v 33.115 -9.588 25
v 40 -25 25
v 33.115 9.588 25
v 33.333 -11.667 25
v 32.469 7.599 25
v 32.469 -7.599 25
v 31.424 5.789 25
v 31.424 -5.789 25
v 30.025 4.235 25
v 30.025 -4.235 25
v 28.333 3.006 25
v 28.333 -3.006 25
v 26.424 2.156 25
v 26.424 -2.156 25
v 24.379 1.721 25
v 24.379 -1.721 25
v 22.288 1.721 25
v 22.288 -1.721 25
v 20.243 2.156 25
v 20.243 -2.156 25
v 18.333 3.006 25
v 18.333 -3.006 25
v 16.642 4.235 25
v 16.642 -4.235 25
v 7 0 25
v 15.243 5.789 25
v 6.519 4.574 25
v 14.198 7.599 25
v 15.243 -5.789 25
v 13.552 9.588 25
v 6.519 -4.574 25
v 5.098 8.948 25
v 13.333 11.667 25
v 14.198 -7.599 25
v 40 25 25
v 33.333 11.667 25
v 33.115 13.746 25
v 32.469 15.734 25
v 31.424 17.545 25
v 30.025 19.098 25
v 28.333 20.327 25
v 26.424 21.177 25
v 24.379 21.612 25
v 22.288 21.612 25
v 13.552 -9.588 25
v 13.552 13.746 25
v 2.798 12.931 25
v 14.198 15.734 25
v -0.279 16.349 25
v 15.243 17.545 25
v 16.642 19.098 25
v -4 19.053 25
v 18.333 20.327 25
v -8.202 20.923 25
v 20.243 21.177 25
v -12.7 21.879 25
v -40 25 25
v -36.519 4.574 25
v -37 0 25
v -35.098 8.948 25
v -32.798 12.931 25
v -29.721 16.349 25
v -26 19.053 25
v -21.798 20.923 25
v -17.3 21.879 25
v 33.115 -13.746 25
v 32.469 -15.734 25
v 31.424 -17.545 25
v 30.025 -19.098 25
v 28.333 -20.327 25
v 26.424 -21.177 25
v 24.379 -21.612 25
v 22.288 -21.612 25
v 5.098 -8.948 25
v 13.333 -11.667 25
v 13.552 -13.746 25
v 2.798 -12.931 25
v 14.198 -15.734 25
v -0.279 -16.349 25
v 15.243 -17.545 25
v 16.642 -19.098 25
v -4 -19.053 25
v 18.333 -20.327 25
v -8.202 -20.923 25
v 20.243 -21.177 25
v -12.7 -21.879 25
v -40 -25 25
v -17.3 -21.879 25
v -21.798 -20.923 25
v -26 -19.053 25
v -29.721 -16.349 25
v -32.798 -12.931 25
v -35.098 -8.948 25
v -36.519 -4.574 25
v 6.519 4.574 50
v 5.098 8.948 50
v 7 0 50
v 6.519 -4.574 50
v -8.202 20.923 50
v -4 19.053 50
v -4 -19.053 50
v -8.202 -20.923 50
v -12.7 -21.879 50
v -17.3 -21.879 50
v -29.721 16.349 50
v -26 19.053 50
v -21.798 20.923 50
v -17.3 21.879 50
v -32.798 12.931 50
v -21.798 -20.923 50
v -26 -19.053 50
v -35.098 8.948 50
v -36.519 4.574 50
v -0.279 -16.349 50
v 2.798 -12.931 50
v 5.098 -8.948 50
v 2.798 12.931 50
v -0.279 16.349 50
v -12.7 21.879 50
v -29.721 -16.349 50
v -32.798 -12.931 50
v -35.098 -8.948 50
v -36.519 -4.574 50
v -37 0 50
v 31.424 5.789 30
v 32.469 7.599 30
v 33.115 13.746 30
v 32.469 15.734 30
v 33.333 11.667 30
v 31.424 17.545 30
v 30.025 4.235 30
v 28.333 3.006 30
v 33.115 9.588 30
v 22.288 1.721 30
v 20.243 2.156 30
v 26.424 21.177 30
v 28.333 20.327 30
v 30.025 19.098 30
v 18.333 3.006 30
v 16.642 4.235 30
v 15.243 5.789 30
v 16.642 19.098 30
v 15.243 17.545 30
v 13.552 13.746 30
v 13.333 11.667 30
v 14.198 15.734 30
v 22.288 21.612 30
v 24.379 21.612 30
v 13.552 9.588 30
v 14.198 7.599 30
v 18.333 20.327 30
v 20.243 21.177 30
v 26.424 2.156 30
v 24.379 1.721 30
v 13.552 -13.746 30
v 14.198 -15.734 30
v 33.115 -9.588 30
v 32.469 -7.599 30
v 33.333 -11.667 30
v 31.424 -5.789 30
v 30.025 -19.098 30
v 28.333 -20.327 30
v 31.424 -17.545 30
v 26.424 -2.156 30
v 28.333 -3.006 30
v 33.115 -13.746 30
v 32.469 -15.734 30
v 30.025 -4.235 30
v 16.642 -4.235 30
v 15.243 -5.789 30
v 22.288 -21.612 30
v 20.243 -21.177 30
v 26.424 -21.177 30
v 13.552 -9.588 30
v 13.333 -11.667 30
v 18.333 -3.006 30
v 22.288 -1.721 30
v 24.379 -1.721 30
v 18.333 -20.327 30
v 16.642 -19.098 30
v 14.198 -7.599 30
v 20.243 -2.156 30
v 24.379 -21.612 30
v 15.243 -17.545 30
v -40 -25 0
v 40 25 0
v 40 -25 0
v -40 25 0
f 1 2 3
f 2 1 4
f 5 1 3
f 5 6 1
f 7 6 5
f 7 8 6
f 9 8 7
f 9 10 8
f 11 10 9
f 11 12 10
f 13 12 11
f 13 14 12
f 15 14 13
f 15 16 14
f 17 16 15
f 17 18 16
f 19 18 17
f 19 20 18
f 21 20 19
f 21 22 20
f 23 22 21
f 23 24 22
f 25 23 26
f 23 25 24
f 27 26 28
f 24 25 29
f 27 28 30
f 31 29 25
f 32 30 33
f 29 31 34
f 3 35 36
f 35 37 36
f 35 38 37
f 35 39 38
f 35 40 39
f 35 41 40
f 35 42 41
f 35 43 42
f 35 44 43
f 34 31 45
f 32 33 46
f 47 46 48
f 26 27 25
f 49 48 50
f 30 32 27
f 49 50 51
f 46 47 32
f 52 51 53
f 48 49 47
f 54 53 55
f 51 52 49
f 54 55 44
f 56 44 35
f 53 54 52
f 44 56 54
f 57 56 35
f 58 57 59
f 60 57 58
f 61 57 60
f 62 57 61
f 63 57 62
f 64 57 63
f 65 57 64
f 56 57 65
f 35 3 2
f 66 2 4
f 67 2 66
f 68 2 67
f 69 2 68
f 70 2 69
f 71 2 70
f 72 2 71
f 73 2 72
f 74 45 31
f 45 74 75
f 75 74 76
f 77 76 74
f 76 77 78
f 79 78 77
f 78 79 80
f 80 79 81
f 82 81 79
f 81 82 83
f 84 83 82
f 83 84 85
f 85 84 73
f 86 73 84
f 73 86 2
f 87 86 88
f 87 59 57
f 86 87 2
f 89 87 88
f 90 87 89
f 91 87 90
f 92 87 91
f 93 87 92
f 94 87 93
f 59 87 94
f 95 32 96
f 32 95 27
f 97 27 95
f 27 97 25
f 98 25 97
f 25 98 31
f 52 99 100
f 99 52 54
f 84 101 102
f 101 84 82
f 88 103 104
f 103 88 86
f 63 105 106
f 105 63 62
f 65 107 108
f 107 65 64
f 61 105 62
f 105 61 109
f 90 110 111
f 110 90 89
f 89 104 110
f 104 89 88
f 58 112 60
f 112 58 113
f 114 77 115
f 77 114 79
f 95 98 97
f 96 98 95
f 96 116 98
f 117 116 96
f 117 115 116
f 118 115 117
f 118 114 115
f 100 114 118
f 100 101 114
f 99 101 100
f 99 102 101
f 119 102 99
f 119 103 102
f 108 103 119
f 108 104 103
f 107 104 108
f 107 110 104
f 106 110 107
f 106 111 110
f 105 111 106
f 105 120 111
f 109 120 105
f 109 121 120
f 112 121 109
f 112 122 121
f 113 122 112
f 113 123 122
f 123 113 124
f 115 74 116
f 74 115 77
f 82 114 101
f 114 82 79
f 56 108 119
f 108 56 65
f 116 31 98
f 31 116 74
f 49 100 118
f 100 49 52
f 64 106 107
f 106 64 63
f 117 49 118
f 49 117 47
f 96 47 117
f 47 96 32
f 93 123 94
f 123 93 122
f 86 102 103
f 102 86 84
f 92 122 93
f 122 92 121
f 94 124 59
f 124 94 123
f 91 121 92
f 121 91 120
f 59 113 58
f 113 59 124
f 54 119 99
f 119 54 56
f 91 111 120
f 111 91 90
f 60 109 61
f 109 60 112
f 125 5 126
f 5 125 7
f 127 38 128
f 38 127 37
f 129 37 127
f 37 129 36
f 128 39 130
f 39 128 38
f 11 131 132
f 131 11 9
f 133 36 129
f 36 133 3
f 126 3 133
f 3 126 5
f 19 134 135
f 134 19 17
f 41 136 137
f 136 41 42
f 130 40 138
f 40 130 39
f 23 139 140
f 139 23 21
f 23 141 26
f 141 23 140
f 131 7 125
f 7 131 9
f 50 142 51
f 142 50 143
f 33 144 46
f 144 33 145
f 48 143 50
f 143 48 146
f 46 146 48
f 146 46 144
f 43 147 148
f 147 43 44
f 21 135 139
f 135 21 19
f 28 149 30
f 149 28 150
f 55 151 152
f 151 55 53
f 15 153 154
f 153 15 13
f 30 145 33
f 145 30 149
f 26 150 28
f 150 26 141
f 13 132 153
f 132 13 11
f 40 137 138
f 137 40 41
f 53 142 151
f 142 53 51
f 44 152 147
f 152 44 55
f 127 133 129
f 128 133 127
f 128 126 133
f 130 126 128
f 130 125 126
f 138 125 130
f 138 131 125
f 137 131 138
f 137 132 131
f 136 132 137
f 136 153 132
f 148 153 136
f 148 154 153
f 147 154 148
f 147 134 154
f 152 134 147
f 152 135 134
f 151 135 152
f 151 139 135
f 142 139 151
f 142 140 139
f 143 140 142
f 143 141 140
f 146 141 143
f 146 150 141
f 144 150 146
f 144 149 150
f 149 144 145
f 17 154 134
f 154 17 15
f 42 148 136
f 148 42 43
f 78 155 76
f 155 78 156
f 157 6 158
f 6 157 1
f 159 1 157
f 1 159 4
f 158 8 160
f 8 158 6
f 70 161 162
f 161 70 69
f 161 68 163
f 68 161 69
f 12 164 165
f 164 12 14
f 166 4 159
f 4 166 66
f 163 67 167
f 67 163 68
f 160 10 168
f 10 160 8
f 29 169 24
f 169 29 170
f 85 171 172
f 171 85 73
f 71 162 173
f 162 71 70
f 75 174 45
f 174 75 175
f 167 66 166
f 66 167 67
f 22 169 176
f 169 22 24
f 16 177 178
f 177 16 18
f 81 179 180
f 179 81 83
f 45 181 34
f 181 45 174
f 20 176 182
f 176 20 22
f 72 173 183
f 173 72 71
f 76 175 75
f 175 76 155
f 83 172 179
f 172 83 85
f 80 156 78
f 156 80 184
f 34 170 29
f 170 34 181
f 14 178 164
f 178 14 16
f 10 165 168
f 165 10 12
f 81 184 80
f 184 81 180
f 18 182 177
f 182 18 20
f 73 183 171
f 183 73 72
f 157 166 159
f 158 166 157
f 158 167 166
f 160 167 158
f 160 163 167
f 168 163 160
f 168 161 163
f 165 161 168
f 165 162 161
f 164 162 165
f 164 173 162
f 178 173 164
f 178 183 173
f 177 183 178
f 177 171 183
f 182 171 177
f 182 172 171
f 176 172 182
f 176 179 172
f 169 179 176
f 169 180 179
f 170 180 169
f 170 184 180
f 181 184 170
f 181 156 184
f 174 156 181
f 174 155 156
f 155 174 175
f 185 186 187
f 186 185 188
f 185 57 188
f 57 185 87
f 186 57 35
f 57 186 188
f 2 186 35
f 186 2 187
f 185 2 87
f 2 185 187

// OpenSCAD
box_size=[80, 50, 25];
board_size=[20, 40, 5];

knob_h=25;
knob_r=22;

button_h=25;
button_r=10;

encoder_size=[15, 15, 15];

// board
translate([-box_size[0]/2, box_size[1]/2 - board_size[1], 0]) {
    color("green", 0.2) cube(board_size);
}

// encoder
translate([-box_size[0]/2 + box_size[1]/2, 0, box_size[2]]) {
    color("black", 0.1) {
        translate([-encoder_size[0]/2, -encoder_size[1]/2 , -encoder_size[2]]) cube(encoder_size);
        cylinder(knob_h, knob_r, knob_r);
    } 
}

// buttons
translate([box_size[0]/2 - box_size[1]/3, 0, box_size[2] - button_h + 5]) {
    offset = (box_size[1]/2 - button_r * 2) / 3 + button_r;
    color("red", 0.1) {
        translate([0, offset, 0]) cylinder(button_h, button_r, button_r);
        translate([0, -offset, 0]) cylinder(button_h, button_r, button_r);
    }
}

// box
translate([-box_size[0]/2, -box_size[1]/2, 0]) {
    color("blue", 0.1) cube(box_size);
}
